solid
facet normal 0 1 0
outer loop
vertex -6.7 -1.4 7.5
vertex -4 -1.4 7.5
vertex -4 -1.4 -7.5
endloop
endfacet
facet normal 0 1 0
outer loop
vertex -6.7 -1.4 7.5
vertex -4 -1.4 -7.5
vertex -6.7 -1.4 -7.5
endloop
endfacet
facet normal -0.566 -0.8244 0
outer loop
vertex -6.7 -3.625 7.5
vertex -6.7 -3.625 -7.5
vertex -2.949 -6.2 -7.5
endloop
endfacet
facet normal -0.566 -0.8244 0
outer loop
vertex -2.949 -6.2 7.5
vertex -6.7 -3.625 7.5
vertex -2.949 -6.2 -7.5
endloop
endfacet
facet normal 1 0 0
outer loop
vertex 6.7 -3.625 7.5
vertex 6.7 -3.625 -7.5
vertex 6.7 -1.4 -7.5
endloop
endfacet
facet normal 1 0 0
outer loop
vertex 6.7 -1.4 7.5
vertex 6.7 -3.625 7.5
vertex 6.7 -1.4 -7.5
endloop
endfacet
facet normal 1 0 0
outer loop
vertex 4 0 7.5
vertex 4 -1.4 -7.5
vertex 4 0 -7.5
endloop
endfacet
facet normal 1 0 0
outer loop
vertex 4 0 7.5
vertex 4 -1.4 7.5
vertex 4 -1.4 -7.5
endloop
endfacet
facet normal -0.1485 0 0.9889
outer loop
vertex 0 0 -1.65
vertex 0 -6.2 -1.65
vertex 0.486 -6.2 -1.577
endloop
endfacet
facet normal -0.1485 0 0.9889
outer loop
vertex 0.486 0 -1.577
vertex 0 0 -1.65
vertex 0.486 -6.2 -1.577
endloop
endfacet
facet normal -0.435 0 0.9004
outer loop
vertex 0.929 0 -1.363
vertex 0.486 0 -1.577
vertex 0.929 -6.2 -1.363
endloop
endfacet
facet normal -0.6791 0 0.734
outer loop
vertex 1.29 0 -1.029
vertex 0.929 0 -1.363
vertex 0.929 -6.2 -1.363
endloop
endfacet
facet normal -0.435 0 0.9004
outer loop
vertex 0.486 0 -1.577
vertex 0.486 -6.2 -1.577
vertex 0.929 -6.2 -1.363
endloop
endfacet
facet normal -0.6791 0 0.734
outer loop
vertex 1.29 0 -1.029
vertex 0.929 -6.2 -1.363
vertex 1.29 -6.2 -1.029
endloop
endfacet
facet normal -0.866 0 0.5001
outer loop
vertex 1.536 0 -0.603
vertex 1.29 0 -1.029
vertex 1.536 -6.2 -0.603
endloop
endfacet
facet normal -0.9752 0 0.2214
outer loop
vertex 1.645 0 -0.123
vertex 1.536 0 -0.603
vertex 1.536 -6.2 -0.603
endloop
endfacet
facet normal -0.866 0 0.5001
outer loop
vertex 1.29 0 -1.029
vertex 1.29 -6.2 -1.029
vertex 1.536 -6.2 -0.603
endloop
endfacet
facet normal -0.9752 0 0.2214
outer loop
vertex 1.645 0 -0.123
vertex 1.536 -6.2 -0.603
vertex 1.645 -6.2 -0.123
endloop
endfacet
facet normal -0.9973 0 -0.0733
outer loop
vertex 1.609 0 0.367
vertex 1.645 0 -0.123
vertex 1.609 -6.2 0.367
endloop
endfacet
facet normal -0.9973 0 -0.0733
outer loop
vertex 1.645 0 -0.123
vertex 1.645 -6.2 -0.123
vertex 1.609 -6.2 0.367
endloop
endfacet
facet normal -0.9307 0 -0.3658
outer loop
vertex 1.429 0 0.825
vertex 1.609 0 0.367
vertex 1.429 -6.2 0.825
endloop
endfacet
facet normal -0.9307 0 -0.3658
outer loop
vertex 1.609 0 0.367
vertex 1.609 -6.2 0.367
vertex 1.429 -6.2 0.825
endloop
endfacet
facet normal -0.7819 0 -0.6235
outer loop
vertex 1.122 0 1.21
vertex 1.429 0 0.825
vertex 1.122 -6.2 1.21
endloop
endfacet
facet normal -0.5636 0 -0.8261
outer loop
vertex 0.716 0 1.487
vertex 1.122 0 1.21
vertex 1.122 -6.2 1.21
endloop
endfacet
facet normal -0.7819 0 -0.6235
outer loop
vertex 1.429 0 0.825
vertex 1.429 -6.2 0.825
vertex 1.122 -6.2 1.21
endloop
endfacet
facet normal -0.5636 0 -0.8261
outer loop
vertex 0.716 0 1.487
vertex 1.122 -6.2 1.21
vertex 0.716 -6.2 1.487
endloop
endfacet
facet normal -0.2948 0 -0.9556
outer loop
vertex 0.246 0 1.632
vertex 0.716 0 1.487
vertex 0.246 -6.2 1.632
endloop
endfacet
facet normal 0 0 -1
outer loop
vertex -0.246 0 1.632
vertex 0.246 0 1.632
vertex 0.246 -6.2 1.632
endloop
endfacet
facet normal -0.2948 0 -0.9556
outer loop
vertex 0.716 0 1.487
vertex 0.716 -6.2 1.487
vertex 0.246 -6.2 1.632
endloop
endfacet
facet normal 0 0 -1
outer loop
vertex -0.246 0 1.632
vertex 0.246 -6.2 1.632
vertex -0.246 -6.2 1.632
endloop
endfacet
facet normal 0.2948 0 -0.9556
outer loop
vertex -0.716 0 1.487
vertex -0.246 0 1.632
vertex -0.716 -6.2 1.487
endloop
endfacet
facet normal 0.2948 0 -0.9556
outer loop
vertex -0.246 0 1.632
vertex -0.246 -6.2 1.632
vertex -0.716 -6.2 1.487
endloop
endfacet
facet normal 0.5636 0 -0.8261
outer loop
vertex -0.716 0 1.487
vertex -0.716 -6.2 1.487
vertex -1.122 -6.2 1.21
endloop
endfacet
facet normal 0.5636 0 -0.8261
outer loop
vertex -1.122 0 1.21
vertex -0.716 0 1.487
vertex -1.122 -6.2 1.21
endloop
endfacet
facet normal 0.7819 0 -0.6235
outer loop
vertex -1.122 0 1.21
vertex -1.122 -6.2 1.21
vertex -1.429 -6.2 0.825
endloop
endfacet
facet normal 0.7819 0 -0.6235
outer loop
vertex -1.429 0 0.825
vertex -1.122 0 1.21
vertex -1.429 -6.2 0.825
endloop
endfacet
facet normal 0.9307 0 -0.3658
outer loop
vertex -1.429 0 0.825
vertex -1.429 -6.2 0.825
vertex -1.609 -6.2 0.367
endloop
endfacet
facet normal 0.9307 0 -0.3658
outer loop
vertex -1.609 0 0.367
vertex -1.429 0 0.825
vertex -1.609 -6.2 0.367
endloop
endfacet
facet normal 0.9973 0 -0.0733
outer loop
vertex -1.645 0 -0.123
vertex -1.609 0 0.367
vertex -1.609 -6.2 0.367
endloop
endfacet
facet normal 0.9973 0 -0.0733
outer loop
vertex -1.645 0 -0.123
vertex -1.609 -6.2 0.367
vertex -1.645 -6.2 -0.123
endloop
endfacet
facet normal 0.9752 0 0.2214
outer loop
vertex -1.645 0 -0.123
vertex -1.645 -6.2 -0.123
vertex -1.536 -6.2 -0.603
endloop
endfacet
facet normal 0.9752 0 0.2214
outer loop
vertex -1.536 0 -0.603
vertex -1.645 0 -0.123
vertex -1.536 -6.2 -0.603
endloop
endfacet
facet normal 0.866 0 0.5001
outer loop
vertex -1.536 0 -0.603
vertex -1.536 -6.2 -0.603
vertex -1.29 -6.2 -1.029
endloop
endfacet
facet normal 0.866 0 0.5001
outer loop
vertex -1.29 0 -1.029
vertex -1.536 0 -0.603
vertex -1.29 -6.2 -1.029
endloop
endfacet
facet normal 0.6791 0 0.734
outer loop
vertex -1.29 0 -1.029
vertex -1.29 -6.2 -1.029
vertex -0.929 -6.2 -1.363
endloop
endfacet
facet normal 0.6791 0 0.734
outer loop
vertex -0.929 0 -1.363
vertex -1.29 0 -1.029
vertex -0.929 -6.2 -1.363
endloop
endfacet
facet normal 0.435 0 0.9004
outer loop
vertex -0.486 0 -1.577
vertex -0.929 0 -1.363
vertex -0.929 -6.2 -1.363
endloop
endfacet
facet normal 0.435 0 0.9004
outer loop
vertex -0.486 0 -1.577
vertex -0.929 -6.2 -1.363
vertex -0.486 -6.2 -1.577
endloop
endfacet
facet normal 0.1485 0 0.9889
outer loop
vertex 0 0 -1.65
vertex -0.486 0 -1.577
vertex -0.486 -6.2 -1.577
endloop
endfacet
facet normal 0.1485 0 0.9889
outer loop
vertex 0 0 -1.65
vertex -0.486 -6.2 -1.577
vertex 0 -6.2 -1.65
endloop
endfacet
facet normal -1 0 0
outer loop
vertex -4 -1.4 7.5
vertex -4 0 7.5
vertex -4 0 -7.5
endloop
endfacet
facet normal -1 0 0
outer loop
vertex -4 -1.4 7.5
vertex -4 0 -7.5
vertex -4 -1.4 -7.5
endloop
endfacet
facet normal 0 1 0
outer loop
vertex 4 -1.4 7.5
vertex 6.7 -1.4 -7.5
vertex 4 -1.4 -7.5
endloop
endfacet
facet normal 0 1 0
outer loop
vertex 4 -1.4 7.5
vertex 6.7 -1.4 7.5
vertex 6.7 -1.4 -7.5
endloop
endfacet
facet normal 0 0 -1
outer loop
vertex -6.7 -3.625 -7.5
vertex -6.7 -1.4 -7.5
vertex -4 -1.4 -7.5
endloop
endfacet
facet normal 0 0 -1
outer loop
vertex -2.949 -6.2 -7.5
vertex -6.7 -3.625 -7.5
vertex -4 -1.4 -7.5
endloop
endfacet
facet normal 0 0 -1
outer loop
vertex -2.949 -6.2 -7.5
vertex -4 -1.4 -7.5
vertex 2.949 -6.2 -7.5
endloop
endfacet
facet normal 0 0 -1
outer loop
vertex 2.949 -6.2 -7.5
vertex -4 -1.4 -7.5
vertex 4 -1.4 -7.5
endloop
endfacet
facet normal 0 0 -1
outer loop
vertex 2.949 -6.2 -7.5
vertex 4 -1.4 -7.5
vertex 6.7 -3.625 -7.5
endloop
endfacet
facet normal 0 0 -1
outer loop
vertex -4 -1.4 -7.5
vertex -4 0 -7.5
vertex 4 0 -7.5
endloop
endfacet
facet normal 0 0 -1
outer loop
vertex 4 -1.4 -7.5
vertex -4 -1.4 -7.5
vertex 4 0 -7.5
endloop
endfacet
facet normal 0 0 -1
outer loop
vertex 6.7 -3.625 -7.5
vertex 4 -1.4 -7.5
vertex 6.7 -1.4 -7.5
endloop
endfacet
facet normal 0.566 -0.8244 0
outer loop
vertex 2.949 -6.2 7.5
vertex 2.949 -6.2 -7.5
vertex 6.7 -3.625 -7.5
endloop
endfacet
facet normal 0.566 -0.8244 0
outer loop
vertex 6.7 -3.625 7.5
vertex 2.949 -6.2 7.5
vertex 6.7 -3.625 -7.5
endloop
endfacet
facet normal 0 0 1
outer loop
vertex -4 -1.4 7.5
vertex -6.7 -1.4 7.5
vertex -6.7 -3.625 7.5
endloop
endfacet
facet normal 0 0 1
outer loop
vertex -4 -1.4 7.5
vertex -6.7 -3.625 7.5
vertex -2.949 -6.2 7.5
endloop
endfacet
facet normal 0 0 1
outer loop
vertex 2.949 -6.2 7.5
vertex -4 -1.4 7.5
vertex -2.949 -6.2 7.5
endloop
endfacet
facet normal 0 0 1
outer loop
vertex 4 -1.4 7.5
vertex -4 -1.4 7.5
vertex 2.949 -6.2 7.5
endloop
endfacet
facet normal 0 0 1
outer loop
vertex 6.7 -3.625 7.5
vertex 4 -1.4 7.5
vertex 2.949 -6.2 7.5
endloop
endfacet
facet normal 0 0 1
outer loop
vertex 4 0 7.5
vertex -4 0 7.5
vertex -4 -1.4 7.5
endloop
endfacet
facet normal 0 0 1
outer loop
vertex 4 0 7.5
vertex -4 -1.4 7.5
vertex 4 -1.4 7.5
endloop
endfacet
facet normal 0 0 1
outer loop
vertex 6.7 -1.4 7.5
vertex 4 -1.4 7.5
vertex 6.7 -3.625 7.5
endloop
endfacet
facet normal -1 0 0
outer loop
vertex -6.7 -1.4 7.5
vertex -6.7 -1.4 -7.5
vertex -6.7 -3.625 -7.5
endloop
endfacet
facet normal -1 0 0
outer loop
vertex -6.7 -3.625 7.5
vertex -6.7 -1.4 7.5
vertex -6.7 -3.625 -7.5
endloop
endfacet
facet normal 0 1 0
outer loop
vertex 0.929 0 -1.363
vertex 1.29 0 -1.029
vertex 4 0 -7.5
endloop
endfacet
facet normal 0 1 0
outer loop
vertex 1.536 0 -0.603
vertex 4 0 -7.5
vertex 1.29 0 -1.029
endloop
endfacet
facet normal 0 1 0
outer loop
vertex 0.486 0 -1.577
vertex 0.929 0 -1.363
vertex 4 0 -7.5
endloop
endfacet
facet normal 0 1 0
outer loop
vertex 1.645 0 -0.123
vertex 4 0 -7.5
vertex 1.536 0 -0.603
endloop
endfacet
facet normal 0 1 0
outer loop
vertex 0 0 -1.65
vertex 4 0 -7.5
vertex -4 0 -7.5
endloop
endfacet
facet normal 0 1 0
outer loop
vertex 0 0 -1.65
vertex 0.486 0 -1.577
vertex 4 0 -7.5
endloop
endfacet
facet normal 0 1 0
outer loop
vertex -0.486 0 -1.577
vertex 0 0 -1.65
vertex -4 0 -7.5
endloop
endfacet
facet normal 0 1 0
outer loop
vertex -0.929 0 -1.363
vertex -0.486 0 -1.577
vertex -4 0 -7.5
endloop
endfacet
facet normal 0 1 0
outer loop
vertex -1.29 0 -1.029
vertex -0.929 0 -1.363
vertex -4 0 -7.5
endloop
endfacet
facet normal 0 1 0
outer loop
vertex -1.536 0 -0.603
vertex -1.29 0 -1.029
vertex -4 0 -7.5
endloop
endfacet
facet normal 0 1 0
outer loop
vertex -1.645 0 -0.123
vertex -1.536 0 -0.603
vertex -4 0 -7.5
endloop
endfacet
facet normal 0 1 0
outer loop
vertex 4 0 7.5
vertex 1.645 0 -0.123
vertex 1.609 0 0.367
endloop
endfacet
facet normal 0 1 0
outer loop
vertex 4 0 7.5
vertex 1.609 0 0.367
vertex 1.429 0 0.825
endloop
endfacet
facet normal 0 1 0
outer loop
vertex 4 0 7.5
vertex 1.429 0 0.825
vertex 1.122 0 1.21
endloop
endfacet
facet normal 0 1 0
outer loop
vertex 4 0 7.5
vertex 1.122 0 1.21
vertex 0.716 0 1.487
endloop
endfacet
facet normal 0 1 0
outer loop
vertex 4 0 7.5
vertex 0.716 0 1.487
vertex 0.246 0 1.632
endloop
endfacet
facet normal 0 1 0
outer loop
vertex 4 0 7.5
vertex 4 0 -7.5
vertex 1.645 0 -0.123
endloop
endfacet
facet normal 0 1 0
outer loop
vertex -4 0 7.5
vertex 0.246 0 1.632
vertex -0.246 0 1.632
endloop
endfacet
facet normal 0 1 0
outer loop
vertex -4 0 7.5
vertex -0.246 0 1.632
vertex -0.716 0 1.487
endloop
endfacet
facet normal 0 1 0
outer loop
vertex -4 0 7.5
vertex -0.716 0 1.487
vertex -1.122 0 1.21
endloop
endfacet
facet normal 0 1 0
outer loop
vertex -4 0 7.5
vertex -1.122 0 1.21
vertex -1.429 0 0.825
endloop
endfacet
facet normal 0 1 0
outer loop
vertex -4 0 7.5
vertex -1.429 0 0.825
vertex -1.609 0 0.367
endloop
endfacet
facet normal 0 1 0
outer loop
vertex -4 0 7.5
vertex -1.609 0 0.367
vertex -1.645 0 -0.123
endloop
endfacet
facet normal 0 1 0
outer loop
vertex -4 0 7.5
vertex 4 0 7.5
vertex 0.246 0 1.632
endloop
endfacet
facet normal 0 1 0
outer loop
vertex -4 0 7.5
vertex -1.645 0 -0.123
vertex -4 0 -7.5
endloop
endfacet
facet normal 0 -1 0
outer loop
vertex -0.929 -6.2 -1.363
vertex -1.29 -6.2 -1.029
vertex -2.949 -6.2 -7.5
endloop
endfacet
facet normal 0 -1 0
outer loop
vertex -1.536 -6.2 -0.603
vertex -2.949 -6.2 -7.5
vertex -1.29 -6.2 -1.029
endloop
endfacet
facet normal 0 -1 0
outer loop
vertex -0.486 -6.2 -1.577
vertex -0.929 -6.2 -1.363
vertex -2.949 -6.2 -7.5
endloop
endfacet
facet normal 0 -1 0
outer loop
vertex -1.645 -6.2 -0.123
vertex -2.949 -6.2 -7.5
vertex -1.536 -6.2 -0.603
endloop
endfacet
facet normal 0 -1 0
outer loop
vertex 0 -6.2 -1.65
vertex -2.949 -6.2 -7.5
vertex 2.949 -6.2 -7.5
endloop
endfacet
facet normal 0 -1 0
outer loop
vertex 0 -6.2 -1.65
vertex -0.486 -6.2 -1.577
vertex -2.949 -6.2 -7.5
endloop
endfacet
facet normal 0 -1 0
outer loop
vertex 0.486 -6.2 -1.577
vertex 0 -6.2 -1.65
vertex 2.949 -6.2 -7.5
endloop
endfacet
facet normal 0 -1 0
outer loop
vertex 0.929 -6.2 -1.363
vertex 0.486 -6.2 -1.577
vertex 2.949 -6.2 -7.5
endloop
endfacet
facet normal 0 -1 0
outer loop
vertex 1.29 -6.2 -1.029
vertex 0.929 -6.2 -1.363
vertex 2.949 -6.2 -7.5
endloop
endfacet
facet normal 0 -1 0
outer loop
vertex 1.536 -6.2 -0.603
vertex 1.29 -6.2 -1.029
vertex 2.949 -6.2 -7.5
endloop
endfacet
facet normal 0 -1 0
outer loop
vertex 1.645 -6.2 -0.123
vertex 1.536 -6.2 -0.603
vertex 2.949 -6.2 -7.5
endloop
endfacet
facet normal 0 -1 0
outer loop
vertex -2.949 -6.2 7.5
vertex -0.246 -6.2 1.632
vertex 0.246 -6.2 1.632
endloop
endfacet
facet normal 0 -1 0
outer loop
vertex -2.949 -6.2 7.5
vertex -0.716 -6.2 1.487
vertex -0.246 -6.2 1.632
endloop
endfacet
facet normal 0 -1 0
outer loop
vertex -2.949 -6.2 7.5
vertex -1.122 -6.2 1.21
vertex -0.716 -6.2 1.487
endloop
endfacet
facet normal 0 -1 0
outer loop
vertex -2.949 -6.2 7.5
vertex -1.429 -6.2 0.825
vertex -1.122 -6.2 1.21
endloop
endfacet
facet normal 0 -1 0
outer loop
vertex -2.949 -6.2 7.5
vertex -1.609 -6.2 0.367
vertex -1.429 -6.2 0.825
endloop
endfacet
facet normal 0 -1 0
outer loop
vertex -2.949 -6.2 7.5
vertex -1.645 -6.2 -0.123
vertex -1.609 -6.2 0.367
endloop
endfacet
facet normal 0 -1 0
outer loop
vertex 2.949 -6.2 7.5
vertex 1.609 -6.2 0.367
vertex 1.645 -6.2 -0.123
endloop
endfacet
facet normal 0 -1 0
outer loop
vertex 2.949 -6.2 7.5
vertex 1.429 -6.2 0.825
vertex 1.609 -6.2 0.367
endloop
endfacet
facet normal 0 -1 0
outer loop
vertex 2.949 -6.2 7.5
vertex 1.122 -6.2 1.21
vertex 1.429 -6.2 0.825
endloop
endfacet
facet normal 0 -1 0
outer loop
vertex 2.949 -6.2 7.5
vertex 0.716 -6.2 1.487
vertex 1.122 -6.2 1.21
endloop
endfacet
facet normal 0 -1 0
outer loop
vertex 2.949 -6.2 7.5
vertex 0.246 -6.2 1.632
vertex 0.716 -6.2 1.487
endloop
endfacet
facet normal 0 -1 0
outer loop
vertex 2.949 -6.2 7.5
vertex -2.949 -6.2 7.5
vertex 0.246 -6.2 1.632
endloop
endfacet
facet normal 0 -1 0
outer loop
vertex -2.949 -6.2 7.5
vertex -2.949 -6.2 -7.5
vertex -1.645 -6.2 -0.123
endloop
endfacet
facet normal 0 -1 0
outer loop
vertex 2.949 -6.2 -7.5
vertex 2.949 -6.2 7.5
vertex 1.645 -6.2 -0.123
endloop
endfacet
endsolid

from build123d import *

# Parameters (mm, degrees)
EXTRUDE_1_DEPTH   = 7.5
HOLE_WIZARD_M41_D = 3.3


with BuildPart() as part:
    # Эскиз1 → Бобышка-Вытянуть1 (new body, symmetric)
    with BuildSketch(Plane.XY):
        Polygon((4, 0), (-4, 0), (-4, -1.4), (-6.7, -1.4), (-6.7, -3.625153657), (-2.948598936, -6.2), (2.948598936, -6.2), (6.7, -3.625153657), (6.7, -1.4), (4, -1.4), align=None)
    extrude(amount=EXTRUDE_1_DEPTH, both=True)

    # Отверстие обработанное метчиком M41 (through all)
    with Locations(Plane.ZX):
        with Locations((0, 0)):
            Hole(HOLE_WIZARD_M41_D / 2)


solid = part.part
